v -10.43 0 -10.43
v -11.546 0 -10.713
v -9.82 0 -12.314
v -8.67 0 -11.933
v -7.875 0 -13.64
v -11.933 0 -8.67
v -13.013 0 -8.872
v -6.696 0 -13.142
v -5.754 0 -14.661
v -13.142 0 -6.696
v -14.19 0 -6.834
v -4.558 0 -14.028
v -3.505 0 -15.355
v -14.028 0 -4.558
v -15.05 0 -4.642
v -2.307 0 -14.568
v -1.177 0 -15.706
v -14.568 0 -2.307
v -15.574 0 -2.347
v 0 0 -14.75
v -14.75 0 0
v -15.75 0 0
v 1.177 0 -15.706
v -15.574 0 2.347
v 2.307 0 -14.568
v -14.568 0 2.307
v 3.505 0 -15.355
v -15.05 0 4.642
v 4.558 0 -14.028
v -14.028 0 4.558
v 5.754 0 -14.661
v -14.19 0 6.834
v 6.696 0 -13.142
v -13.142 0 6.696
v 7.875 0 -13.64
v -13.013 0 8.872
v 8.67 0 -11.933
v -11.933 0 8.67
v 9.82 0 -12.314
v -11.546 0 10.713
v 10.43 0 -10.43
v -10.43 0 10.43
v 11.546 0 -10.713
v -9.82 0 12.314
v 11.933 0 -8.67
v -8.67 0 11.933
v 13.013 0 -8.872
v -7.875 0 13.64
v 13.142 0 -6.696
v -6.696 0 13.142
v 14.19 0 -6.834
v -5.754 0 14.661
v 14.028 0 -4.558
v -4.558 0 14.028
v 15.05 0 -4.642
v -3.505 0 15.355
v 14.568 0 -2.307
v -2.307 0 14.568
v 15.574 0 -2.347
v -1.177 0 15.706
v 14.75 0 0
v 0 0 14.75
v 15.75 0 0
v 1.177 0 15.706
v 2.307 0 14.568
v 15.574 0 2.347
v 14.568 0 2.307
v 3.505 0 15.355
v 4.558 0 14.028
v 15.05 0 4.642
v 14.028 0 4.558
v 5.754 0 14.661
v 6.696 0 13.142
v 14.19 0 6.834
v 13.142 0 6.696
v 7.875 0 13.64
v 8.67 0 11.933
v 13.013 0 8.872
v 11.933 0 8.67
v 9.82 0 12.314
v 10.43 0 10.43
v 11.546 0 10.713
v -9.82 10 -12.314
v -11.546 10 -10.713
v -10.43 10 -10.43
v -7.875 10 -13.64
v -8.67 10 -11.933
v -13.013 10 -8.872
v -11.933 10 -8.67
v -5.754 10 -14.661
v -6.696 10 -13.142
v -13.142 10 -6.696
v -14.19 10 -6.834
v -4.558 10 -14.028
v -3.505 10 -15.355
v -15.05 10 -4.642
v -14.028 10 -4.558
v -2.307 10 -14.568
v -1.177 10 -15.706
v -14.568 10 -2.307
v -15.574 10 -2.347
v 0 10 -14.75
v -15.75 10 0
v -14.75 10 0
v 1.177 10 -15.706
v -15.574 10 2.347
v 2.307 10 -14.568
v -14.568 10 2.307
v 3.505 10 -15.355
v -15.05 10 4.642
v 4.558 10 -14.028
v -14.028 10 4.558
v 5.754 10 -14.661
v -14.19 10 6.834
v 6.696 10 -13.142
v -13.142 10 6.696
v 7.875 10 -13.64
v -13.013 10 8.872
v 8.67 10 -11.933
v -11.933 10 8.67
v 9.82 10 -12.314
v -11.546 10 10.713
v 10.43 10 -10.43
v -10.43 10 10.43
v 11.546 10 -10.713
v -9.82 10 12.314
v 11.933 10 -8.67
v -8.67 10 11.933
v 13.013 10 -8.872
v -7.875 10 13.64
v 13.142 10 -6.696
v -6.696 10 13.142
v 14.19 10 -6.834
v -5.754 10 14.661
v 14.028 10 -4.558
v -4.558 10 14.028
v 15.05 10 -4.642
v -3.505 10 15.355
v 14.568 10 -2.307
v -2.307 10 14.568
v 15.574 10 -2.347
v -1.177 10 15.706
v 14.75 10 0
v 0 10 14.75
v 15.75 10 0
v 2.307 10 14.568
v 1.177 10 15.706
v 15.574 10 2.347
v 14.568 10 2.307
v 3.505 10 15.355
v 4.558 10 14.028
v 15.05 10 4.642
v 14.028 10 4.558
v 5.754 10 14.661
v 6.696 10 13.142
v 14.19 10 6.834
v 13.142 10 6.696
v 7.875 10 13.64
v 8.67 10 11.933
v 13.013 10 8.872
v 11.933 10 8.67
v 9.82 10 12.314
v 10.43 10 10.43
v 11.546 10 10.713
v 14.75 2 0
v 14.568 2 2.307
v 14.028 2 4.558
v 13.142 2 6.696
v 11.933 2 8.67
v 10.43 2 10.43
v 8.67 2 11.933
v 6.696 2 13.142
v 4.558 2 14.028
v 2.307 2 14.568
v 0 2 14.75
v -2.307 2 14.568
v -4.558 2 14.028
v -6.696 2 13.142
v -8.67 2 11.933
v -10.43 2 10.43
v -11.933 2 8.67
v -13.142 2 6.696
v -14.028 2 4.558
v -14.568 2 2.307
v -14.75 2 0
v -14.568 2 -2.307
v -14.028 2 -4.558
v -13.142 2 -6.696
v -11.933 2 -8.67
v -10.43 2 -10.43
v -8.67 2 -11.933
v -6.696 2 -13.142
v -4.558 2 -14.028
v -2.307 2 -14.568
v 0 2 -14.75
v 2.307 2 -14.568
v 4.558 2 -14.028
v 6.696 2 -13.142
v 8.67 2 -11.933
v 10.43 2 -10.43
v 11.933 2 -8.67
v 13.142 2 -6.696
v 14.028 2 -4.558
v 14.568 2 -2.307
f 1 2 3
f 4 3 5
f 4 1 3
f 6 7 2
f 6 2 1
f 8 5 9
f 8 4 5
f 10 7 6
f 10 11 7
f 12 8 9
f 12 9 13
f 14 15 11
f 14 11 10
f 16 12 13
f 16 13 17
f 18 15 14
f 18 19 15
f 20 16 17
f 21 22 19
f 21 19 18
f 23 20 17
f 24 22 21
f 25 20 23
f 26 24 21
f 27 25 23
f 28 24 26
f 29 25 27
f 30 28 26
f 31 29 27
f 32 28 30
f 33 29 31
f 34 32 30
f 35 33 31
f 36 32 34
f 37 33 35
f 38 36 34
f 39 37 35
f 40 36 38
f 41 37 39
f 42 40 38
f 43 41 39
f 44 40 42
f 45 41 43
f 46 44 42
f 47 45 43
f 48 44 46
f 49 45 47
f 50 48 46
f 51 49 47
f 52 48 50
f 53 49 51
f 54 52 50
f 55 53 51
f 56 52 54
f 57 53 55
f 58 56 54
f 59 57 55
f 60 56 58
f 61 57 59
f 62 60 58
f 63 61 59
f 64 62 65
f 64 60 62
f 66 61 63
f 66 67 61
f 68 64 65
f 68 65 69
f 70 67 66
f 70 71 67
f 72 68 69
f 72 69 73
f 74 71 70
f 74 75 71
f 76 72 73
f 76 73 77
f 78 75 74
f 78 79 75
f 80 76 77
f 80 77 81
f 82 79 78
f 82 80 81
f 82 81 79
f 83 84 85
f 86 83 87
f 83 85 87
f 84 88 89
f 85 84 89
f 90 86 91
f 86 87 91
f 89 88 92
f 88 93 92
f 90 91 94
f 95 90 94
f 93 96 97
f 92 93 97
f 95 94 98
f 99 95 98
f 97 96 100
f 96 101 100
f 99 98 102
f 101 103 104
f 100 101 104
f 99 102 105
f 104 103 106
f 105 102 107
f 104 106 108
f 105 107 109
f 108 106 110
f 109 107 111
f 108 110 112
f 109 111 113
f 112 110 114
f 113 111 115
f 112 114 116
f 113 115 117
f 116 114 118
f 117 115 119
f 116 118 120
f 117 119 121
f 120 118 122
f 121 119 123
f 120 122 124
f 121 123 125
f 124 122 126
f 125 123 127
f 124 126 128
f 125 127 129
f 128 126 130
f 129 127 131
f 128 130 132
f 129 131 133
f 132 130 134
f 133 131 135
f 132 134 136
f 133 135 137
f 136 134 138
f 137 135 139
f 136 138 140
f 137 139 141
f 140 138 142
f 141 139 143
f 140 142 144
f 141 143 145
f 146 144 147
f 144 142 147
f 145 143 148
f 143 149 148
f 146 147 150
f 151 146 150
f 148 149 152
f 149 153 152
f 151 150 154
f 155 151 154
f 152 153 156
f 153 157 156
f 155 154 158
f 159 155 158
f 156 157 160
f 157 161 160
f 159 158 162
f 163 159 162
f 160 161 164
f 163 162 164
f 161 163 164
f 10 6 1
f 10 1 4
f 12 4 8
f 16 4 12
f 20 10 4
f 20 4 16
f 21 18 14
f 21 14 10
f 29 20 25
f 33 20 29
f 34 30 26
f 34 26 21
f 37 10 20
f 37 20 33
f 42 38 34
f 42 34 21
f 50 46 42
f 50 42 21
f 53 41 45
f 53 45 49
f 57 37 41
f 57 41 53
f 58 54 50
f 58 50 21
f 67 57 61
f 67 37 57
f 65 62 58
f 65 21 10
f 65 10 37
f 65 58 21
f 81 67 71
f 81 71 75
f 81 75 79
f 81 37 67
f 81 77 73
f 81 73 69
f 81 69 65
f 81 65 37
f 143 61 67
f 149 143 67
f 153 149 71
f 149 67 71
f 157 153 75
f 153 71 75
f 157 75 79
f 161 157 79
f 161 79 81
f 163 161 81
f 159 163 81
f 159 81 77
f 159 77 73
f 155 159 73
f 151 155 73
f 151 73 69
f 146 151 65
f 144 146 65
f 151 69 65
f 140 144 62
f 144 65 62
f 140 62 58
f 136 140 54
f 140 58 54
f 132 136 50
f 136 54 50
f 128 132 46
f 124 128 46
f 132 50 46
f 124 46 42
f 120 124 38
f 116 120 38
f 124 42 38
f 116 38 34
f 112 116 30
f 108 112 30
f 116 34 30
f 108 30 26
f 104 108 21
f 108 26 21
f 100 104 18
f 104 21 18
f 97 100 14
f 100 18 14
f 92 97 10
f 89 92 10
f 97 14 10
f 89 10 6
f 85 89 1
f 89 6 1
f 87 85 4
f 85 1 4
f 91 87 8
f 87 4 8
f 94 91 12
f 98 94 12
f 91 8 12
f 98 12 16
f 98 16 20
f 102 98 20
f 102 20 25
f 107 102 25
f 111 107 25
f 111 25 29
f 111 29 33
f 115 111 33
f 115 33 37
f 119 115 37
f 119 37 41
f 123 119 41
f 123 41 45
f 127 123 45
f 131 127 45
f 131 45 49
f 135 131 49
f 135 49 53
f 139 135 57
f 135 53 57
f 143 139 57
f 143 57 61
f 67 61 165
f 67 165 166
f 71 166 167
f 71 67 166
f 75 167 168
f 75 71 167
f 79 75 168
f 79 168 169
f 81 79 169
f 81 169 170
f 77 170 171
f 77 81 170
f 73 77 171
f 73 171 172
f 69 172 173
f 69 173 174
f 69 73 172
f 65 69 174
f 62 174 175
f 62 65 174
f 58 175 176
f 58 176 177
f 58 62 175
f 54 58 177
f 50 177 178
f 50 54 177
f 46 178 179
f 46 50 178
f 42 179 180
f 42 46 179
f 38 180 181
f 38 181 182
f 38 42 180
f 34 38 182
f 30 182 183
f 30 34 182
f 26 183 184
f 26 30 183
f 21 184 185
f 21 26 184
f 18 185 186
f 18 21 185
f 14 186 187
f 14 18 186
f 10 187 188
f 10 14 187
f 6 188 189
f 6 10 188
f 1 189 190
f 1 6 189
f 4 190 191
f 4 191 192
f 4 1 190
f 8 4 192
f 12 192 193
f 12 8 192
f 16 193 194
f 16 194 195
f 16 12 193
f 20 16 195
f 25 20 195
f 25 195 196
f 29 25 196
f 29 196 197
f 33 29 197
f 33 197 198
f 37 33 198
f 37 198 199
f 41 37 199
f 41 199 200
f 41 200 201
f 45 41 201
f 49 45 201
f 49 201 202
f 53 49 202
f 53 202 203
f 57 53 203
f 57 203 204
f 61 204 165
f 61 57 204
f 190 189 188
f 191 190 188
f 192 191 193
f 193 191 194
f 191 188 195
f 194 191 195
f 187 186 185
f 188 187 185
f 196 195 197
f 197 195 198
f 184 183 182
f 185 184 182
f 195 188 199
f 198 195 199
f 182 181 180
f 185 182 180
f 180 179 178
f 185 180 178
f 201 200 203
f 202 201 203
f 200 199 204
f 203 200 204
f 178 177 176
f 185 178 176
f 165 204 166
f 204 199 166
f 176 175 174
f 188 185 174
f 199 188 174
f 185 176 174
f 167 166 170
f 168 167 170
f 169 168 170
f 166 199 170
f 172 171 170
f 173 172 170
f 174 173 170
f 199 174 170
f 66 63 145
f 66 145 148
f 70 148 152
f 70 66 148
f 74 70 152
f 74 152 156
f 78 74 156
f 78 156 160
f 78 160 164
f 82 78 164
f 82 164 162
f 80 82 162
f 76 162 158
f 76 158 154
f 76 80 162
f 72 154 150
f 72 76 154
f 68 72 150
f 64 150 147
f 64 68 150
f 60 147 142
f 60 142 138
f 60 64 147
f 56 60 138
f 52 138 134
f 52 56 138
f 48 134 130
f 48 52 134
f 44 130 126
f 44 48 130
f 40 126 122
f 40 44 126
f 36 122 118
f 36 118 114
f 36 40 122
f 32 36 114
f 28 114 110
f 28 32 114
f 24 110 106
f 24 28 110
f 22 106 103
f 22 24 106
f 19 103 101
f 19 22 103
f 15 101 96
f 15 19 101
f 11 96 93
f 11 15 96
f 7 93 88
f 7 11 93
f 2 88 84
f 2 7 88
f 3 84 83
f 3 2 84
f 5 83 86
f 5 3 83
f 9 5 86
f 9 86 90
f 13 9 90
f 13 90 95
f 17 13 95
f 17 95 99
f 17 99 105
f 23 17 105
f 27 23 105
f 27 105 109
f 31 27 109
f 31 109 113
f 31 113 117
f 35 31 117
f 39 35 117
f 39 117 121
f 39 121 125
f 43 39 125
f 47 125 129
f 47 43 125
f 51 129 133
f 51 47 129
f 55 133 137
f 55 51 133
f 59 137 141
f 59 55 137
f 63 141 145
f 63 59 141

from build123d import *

# Parameters (mm, degrees)
F0_R     = 15.75
F0_R_2   = 14.75
F1_DEPTH = 10
F2_R     = 14.75
F3_DEPTH = 8
F4_DEPTH = 2


with BuildPart() as f1:
    # F0 (on Front) → F1 (new body)
    with BuildSketch(Plane.XZ):
        Circle(F0_R)
        Circle(F0_R_2, mode=Mode.SUBTRACT)
    extrude(amount=-F1_DEPTH)

    # F2 (on Front) → F3 (cut)
    with BuildSketch(Plane.XZ):
        Circle(F2_R)
    extrude(amount=F3_DEPTH, mode=Mode.SUBTRACT)


with BuildPart() as f4:
    # F2 (on Front) → F4 (new body)
    with BuildSketch(Plane.XZ):
        Circle(F2_R)
    extrude(amount=-F4_DEPTH)


solid = Compound([f1.part, f4.part])
